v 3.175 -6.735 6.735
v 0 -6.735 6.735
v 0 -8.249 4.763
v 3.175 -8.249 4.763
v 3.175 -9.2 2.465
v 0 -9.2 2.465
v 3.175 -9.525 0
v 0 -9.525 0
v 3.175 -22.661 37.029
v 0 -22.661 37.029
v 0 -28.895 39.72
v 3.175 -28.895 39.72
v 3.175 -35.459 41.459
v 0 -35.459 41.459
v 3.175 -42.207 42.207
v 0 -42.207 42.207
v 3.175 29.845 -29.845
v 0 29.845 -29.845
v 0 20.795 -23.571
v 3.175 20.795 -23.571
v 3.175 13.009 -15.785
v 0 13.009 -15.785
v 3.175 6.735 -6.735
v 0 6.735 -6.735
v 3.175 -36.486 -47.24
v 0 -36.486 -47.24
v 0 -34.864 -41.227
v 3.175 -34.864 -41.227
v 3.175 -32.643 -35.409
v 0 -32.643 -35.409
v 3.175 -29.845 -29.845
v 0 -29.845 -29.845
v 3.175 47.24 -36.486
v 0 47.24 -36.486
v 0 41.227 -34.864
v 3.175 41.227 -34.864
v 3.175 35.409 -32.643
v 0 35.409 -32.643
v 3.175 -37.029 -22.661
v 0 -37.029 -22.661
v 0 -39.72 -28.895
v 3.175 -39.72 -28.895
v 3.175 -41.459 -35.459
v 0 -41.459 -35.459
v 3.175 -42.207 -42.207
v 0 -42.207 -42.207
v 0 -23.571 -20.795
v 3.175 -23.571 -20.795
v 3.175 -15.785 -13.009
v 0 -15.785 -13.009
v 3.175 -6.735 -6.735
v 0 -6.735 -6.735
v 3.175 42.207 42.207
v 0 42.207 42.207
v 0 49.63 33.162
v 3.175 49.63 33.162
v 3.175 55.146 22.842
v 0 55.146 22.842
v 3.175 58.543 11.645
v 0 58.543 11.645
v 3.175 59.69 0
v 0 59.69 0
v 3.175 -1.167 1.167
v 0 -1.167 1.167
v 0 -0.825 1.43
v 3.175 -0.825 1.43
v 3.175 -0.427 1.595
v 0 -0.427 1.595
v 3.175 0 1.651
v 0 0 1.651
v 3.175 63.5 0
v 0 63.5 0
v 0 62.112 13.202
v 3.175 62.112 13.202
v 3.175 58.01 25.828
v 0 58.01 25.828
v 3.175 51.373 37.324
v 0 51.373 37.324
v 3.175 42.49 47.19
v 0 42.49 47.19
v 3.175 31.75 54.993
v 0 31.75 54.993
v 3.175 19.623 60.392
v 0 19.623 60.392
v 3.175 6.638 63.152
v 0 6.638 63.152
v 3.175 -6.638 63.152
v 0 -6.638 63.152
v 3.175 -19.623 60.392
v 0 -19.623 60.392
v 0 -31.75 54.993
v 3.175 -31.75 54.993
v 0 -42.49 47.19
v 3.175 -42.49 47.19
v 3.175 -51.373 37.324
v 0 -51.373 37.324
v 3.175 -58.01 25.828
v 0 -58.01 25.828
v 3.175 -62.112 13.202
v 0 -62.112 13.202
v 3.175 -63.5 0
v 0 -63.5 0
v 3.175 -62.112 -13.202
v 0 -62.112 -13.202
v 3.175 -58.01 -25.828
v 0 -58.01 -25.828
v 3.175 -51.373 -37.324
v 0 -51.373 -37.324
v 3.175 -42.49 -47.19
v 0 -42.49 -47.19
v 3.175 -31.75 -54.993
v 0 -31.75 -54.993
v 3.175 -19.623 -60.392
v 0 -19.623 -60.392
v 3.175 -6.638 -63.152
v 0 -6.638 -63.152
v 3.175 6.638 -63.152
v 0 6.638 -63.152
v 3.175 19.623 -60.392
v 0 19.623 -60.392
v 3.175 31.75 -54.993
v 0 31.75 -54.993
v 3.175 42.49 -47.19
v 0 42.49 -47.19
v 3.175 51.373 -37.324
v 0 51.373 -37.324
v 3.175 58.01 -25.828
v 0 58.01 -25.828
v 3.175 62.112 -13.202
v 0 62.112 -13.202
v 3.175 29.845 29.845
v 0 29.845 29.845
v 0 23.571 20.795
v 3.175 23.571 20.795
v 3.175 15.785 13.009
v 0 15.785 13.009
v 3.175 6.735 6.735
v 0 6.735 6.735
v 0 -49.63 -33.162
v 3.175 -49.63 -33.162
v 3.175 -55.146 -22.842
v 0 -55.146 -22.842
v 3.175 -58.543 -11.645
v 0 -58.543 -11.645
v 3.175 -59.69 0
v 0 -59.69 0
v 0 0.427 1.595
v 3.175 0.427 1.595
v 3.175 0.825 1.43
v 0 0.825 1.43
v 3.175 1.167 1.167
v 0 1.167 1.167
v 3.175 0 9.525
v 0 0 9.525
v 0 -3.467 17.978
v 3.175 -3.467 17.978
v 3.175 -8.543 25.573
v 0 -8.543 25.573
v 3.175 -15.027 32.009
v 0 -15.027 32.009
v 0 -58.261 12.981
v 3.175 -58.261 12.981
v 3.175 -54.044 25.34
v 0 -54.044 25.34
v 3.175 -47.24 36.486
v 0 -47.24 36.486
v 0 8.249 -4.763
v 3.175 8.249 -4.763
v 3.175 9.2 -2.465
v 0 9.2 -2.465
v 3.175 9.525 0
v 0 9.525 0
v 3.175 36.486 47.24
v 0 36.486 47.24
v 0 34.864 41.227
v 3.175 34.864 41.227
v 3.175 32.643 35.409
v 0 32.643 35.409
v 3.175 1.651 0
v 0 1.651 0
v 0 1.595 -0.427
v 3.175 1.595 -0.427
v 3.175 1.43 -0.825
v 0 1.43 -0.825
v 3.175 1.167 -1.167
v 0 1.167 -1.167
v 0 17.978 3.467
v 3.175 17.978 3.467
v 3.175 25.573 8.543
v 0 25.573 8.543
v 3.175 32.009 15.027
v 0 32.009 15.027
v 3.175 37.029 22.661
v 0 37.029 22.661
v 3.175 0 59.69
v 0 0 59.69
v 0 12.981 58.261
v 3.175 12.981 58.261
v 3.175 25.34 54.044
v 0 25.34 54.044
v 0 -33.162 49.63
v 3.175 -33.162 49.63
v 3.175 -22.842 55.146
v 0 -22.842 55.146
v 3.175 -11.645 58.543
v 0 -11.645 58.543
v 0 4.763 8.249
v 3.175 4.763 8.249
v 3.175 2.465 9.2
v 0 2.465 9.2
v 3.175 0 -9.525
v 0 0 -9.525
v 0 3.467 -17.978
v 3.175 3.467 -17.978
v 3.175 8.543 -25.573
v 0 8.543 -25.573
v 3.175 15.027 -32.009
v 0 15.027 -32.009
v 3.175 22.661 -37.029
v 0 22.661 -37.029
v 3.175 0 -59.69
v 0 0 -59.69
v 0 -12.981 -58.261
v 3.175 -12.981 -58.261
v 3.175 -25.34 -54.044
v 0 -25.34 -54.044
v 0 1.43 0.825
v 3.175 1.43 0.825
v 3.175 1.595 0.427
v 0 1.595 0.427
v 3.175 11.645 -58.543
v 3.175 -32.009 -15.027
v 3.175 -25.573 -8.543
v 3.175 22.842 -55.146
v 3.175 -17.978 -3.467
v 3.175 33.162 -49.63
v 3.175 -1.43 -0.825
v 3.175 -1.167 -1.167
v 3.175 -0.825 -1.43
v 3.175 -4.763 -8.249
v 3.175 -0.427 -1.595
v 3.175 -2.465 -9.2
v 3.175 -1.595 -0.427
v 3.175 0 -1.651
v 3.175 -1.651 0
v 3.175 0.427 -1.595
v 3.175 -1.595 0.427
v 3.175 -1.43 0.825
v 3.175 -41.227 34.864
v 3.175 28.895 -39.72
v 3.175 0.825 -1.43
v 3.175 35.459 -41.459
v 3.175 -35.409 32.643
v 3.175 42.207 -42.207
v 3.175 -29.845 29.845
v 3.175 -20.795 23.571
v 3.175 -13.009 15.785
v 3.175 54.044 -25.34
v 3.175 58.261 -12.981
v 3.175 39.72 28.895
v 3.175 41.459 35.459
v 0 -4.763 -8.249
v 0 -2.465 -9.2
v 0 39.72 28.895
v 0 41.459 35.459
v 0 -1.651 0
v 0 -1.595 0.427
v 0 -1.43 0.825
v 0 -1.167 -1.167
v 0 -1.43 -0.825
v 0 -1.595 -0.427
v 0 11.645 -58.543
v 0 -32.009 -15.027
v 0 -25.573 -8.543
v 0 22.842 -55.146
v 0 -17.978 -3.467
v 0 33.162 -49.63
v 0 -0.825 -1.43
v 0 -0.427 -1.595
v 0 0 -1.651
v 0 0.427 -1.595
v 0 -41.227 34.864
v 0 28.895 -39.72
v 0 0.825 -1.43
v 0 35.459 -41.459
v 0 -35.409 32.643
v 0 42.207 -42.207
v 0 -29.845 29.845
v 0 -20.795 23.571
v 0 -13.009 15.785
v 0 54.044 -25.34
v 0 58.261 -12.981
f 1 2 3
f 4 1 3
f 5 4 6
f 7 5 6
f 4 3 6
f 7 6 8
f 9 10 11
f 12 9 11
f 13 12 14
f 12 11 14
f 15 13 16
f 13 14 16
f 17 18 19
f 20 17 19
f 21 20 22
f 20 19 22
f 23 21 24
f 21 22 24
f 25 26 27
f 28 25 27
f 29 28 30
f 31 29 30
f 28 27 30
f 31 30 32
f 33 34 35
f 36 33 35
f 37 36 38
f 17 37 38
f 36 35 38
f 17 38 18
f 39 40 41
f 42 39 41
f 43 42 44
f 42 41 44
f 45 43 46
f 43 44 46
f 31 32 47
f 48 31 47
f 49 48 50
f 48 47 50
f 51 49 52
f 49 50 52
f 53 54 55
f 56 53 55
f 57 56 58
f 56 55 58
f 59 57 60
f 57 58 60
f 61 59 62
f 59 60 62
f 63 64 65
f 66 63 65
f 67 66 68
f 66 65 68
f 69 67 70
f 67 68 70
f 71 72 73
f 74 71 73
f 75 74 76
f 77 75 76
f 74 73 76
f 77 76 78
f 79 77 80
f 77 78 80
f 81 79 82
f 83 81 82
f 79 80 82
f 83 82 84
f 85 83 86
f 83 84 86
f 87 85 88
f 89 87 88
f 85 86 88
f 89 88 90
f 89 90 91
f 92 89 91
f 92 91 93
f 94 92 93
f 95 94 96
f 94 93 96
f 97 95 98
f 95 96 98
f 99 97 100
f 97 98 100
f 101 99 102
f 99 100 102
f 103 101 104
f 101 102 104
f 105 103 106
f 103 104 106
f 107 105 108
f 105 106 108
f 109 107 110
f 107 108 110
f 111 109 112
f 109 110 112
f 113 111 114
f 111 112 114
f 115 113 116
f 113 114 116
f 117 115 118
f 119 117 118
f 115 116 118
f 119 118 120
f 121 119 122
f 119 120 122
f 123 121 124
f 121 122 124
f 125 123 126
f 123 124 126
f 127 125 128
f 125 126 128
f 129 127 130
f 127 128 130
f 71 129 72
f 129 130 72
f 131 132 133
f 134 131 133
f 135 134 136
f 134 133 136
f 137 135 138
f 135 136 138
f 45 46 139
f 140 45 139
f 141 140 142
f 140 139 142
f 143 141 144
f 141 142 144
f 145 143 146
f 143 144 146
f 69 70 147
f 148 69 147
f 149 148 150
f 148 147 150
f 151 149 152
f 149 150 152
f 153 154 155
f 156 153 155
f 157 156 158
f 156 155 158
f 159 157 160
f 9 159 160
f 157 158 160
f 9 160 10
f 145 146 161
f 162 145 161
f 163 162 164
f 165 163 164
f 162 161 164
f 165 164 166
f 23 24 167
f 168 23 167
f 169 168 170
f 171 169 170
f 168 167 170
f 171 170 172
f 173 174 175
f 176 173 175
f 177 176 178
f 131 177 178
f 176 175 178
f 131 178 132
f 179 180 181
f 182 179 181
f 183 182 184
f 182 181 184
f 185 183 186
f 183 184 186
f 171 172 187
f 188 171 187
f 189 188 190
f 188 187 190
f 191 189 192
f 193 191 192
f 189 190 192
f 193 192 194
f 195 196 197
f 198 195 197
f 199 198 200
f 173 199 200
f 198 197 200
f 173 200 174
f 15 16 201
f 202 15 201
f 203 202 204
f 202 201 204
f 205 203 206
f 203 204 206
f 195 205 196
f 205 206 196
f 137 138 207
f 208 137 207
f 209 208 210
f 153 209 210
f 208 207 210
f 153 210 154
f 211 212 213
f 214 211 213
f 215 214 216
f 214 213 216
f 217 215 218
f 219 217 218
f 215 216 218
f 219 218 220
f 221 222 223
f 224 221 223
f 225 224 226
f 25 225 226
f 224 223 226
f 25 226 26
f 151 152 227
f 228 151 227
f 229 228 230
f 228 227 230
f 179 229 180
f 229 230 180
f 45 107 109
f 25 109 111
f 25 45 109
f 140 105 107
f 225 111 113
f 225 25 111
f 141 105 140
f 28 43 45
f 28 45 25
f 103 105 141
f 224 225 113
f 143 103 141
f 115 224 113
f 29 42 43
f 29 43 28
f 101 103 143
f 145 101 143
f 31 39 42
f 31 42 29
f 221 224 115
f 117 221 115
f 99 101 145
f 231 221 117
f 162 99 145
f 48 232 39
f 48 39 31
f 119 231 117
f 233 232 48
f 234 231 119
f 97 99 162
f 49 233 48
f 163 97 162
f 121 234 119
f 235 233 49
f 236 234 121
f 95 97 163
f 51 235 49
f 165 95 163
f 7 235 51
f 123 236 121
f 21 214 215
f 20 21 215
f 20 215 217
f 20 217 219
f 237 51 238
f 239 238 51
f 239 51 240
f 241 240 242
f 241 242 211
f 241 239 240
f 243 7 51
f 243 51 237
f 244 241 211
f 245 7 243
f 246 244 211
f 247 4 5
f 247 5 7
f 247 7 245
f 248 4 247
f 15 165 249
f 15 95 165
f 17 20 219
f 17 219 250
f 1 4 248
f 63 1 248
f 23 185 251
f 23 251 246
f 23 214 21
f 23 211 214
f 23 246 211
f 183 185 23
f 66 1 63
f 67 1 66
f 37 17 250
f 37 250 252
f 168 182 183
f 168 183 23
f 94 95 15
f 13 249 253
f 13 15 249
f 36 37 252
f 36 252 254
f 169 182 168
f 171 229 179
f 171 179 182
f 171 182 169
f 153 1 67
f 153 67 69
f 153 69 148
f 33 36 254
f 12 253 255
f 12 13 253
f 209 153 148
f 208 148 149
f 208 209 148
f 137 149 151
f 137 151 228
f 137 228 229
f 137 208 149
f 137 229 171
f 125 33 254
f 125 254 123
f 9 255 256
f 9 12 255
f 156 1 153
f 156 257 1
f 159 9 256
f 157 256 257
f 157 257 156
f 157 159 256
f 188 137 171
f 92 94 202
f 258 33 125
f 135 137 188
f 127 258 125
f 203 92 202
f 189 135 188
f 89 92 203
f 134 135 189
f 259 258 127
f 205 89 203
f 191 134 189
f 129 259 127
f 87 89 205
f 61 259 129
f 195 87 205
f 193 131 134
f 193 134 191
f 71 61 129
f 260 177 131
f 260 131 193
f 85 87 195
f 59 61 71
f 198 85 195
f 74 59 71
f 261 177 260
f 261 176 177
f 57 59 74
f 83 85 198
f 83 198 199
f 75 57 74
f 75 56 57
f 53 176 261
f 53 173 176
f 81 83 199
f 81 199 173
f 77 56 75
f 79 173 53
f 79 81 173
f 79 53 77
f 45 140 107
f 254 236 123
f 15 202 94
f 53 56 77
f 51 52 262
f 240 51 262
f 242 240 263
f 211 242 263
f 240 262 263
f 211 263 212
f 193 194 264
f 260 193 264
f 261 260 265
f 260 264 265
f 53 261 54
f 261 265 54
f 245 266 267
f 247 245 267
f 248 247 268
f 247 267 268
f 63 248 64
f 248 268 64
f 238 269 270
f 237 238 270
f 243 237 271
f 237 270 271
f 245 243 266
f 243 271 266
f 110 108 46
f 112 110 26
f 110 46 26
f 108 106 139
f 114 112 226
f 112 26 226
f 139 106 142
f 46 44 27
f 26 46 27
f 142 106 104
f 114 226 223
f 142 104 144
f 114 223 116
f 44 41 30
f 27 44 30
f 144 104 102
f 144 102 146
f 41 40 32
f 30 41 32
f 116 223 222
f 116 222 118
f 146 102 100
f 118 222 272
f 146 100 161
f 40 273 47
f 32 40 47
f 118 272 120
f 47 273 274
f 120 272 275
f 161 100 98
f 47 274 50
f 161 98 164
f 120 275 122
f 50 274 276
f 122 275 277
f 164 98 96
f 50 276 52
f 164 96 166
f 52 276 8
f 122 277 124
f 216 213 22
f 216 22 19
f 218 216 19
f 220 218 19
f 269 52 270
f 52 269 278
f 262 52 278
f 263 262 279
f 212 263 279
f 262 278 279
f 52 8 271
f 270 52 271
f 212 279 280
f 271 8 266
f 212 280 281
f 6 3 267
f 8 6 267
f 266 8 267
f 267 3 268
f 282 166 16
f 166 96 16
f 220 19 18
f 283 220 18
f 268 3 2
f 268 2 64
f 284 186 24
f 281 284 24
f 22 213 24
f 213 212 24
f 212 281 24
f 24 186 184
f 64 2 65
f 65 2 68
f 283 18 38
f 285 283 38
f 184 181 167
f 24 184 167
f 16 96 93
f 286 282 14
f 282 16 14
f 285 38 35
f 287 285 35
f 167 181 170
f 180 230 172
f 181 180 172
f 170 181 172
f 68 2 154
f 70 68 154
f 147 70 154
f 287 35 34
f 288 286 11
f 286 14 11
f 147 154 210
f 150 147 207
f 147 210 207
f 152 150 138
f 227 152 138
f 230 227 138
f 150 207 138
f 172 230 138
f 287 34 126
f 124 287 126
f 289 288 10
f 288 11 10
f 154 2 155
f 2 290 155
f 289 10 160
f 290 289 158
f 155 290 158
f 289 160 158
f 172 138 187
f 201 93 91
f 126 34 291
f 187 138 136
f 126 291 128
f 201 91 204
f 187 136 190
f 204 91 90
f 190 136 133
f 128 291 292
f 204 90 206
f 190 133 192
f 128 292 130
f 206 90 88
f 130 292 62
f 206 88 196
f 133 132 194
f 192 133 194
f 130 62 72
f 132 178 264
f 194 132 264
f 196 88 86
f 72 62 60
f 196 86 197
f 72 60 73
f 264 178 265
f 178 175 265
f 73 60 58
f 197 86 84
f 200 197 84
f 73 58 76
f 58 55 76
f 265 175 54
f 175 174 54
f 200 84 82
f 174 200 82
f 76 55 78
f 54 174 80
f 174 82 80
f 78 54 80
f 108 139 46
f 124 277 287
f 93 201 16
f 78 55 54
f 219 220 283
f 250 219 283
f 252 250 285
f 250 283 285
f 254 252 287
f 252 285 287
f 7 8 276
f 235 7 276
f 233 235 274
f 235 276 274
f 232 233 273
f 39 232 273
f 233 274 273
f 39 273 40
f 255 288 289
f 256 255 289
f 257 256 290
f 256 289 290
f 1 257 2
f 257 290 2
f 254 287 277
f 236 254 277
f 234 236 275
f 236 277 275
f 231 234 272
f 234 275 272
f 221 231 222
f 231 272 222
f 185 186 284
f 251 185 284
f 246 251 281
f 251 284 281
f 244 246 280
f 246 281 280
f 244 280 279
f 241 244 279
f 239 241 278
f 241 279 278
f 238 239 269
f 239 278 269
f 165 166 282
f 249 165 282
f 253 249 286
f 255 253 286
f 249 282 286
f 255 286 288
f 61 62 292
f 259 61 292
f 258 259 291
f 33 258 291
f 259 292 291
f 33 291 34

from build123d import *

# Parameters (mm, degrees)
F0_R     = 63.5
F1_DEPTH = 3.175


with BuildPart() as f1:
    # F0 (on Right) → F1 (new body)
    with BuildSketch(Plane.YZ):
        Circle(F0_R)
        with BuildLine():
            ThreePointArc((42.207203769, 42.207203769), (55.1463692956, 22.8423740779), (59.69, 0))
            ThreePointArc((59.69, 0), (56.4919386946, -19.2758128889), (47.240445216, -36.486112917))
            ThreePointArc((47.240445216, -36.486112917), (44.8152116738, -39.4270580012), (42.207203769, -42.207203769))
            ThreePointArc((42.207203769, -42.207203769), (22.8423740779, -55.1463692956), (0, -59.69))
            ThreePointArc((0, -59.69), (-19.2758128889, -56.4919386946), (-36.486112917, -47.240445216))
            ThreePointArc((-36.486112917, -47.240445216), (-39.4270580012, -44.8152116738), (-42.207203769, -42.207203769))
            ThreePointArc((-42.207203769, -42.207203769), (-55.1463692956, -22.8423740779), (-59.69, 0))
            ThreePointArc((-59.69, 0), (-56.4919386946, 19.2758128889), (-47.240445216, 36.486112917))
            ThreePointArc((-47.240445216, 36.486112917), (-44.8152116738, 39.4270580012), (-42.207203769, 42.207203769))
            ThreePointArc((-42.207203769, 42.207203769), (-22.8423740779, 55.1463692956), (0, 59.69))
            ThreePointArc((0, 59.69), (19.2758128889, 56.4919386946), (36.486112917, 47.240445216))
            ThreePointArc((36.486112917, 47.240445216), (39.4270580012, 44.8152116738), (42.207203769, 42.207203769))
        make_face(mode=Mode.SUBTRACT)
        with BuildLine():
            ThreePointArc((29.845, -29.845), (16.7276475457, -19.8525445451), (6.7351920908, -6.7351920908))
            ThreePointArc((6.7351920908, -6.7351920908), (3.6450596933, -8.7999525472), (0, -9.525))
            ThreePointArc((0, -9.525), (8.5432084009, -25.5734757664), (22.6607951031, -37.0292048969))
            Line((22.6607951031, -37.0292048969), (29.845, -29.845))
        make_face()
        with BuildLine():
            ThreePointArc((-6.7351920908, 6.7351920908), (-3.6450596933, 8.7999525472), (0, 9.525))
            ThreePointArc((0, 9.525), (-8.5432084009, 25.5734757664), (-22.6607951031, 37.0292048969))
            Line((-22.6607951031, 37.0292048969), (-29.845, 29.845))
            ThreePointArc((-29.845, 29.845), (-16.7276475457, 19.8525445451), (-6.7351920908, 6.7351920908))
        make_face()
        with BuildLine():
            ThreePointArc((6.7351920908, 6.7351920908), (8.7999525472, 3.6450596933), (9.525, 0))
            ThreePointArc((9.525, 0), (25.5734757664, 8.5432084009), (37.0292048969, 22.6607951031))
            Line((37.0292048969, 22.6607951031), (29.845, 29.845))
            ThreePointArc((29.845, 29.845), (19.8525445451, 16.7276475457), (6.7351920908, 6.7351920908))
        make_face()
        with BuildLine():
            ThreePointArc((-29.845, -29.845), (-19.8525445451, -16.7276475457), (-6.7351920908, -6.7351920908))
            ThreePointArc((-6.7351920908, -6.7351920908), (-8.7999525472, -3.6450596933), (-9.525, 0))
            ThreePointArc((-9.525, 0), (-25.5734757664, -8.5432084009), (-37.0292048969, -22.6607951031))
            Line((-37.0292048969, -22.6607951031), (-29.845, -29.845))
        make_face()
        with BuildLine():
            Line((-42.207203769, -42.207203769), (-29.845, -29.845))
            Line((-29.845, -29.845), (-37.0292048969, -22.6607951031))
            ThreePointArc((-37.0292048969, -22.6607951031), (-40.7112653305, -32.1444388979), (-42.207203769, -42.207203769))
        make_face()
        with BuildLine():
            Line((42.207203769, -42.207203769), (29.845, -29.845))
            Line((29.845, -29.845), (22.6607951031, -37.0292048969))
            ThreePointArc((22.6607951031, -37.0292048969), (32.1444388979, -40.7112653305), (42.207203769, -42.207203769))
        make_face()
        with BuildLine():
            Line((29.845, 29.845), (37.0292048969, 22.6607951031))
            ThreePointArc((37.0292048969, 22.6607951031), (40.7112653305, 32.1444388979), (42.207203769, 42.207203769))
            Line((42.207203769, 42.207203769), (29.845, 29.845))
        make_face()
        with BuildLine():
            Line((-29.845, 29.845), (-22.6607951031, 37.0292048969))
            ThreePointArc((-22.6607951031, 37.0292048969), (-32.1444388979, 40.7112653305), (-42.207203769, 42.207203769))
            Line((-42.207203769, 42.207203769), (-29.845, 29.845))
        make_face()
        with BuildLine():
            ThreePointArc((-36.486112917, -47.240445216), (-33.8273957569, -38.2900501722), (-29.845, -29.845))
            Line((-29.845, -29.845), (-42.207203769, -42.207203769))
            Line((-42.207203769, -42.207203769), (-36.486112917, -47.240445216))
        make_face()
        with BuildLine():
            ThreePointArc((47.240445216, -36.486112917), (38.2900501722, -33.8273957569), (29.845, -29.845))
            Line((29.845, -29.845), (42.207203769, -42.207203769))
            Line((42.207203769, -42.207203769), (47.240445216, -36.486112917))
        make_face()
        with BuildLine():
            ThreePointArc((36.486112917, 47.240445216), (33.8273957569, 38.2900501722), (29.845, 29.845))
            Line((29.845, 29.845), (42.207203769, 42.207203769))
            Line((42.207203769, 42.207203769), (36.486112917, 47.240445216))
        make_face()
        with BuildLine():
            ThreePointArc((-47.240445216, 36.486112917), (-38.2900501722, 33.8273957569), (-29.845, 29.845))
            Line((-29.845, 29.845), (-42.207203769, 42.207203769))
            Line((-42.207203769, 42.207203769), (-47.240445216, 36.486112917))
        make_face()
        with BuildLine():
            Line((9.525, 0), (1.651, 0))
            ThreePointArc((1.651, 0), (1.5253251082, -0.6318103468), (1.1674332957, -1.1674332957))
            Line((1.1674332957, -1.1674332957), (6.7351920908, -6.7351920908))
            ThreePointArc((6.7351920908, -6.7351920908), (8.7999525472, -3.6450596933), (9.525, 0))
        make_face()
        with BuildLine():
            ThreePointArc((-1.1674332957, 1.1674332957), (-0.6318103468, 1.5253251082), (0, 1.651))
            Line((0, 1.651), (0, 9.525))
            ThreePointArc((0, 9.525), (-3.6450596933, 8.7999525472), (-6.7351920908, 6.7351920908))
            Line((-6.7351920908, 6.7351920908), (-1.1674332957, 1.1674332957))
        make_face()
        with BuildLine():
            ThreePointArc((-1.651, 0), (-1.5253251082, 0.6318103468), (-1.1674332957, 1.1674332957))
            Line((-1.1674332957, 1.1674332957), (-6.7351920908, 6.7351920908))
            ThreePointArc((-6.7351920908, 6.7351920908), (-8.7999525472, 3.6450596933), (-9.525, 0))
            Line((-9.525, 0), (-1.651, 0))
        make_face()
        with BuildLine():
            Line((-6.7351920908, -6.7351920908), (-1.1674332957, -1.1674332957))
            ThreePointArc((-1.1674332957, -1.1674332957), (-1.5253251082, -0.6318103468), (-1.651, 0))
            Line((-1.651, 0), (-9.525, 0))
            ThreePointArc((-9.525, 0), (-8.7999525472, -3.6450596933), (-6.7351920908, -6.7351920908))
        make_face()
        with BuildLine():
            Line((0, -9.525), (0, -1.651))
            ThreePointArc((0, -1.651), (-0.6318103468, -1.5253251082), (-1.1674332957, -1.1674332957))
            Line((-1.1674332957, -1.1674332957), (-6.7351920908, -6.7351920908))
            ThreePointArc((-6.7351920908, -6.7351920908), (-3.6450596933, -8.7999525472), (0, -9.525))
        make_face()
        with BuildLine():
            Line((6.7351920908, -6.7351920908), (1.1674332957, -1.1674332957))
            ThreePointArc((1.1674332957, -1.1674332957), (0.6318103468, -1.5253251082), (0, -1.651))
            Line((0, -1.651), (0, -9.525))
            ThreePointArc((0, -9.525), (3.6450596933, -8.7999525472), (6.7351920908, -6.7351920908))
        make_face()
        with BuildLine():
            ThreePointArc((1.1674332957, 1.1674332957), (1.5253251082, 0.6318103468), (1.651, 0))
            Line((1.651, 0), (9.525, 0))
            Line((9.525, 0), (4.7625, 4.7625))
            Line((4.7625, 4.7625), (1.1674332957, 1.1674332957))
        make_face()
        with BuildLine():
            ThreePointArc((0, 1.651), (0.6318103468, 1.5253251082), (1.1674332957, 1.1674332957))
            Line((1.1674332957, 1.1674332957), (4.7625, 4.7625))
            Line((4.7625, 4.7625), (0, 9.525))
            Line((0, 9.525), (0, 1.651))
        make_face()
        with BuildLine():
            Line((4.7625, 4.7625), (9.525, 0))
            ThreePointArc((9.525, 0), (8.7999525472, 3.6450596933), (6.7351920908, 6.7351920908))
            Line((6.7351920908, 6.7351920908), (4.7625, 4.7625))
        make_face()
        with BuildLine():
            Line((0, 9.525), (4.7625, 4.7625))
            Line((4.7625, 4.7625), (6.7351920908, 6.7351920908))
            ThreePointArc((6.7351920908, 6.7351920908), (3.6450596933, 8.7999525472), (0, 9.525))
        make_face()
        with BuildLine():
            Line((-47.240445216, 36.486112917), (-42.207203769, 42.207203769))
            ThreePointArc((-42.207203769, 42.207203769), (-44.8152116738, 39.4270580012), (-47.240445216, 36.486112917))
        make_face()
        with BuildLine():
            Line((-36.486112917, -47.240445216), (-42.207203769, -42.207203769))
            ThreePointArc((-42.207203769, -42.207203769), (-39.4270580012, -44.8152116738), (-36.486112917, -47.240445216))
        make_face()
        with BuildLine():
            Line((47.240445216, -36.486112917), (42.207203769, -42.207203769))
            ThreePointArc((42.207203769, -42.207203769), (44.8152116738, -39.4270580012), (47.240445216, -36.486112917))
        make_face()
        with BuildLine():
            Line((36.486112917, 47.240445216), (42.207203769, 42.207203769))
            ThreePointArc((42.207203769, 42.207203769), (39.4270580012, 44.8152116738), (36.486112917, 47.240445216))
        make_face()
    extrude(amount=F1_DEPTH)


solid = f1.part
